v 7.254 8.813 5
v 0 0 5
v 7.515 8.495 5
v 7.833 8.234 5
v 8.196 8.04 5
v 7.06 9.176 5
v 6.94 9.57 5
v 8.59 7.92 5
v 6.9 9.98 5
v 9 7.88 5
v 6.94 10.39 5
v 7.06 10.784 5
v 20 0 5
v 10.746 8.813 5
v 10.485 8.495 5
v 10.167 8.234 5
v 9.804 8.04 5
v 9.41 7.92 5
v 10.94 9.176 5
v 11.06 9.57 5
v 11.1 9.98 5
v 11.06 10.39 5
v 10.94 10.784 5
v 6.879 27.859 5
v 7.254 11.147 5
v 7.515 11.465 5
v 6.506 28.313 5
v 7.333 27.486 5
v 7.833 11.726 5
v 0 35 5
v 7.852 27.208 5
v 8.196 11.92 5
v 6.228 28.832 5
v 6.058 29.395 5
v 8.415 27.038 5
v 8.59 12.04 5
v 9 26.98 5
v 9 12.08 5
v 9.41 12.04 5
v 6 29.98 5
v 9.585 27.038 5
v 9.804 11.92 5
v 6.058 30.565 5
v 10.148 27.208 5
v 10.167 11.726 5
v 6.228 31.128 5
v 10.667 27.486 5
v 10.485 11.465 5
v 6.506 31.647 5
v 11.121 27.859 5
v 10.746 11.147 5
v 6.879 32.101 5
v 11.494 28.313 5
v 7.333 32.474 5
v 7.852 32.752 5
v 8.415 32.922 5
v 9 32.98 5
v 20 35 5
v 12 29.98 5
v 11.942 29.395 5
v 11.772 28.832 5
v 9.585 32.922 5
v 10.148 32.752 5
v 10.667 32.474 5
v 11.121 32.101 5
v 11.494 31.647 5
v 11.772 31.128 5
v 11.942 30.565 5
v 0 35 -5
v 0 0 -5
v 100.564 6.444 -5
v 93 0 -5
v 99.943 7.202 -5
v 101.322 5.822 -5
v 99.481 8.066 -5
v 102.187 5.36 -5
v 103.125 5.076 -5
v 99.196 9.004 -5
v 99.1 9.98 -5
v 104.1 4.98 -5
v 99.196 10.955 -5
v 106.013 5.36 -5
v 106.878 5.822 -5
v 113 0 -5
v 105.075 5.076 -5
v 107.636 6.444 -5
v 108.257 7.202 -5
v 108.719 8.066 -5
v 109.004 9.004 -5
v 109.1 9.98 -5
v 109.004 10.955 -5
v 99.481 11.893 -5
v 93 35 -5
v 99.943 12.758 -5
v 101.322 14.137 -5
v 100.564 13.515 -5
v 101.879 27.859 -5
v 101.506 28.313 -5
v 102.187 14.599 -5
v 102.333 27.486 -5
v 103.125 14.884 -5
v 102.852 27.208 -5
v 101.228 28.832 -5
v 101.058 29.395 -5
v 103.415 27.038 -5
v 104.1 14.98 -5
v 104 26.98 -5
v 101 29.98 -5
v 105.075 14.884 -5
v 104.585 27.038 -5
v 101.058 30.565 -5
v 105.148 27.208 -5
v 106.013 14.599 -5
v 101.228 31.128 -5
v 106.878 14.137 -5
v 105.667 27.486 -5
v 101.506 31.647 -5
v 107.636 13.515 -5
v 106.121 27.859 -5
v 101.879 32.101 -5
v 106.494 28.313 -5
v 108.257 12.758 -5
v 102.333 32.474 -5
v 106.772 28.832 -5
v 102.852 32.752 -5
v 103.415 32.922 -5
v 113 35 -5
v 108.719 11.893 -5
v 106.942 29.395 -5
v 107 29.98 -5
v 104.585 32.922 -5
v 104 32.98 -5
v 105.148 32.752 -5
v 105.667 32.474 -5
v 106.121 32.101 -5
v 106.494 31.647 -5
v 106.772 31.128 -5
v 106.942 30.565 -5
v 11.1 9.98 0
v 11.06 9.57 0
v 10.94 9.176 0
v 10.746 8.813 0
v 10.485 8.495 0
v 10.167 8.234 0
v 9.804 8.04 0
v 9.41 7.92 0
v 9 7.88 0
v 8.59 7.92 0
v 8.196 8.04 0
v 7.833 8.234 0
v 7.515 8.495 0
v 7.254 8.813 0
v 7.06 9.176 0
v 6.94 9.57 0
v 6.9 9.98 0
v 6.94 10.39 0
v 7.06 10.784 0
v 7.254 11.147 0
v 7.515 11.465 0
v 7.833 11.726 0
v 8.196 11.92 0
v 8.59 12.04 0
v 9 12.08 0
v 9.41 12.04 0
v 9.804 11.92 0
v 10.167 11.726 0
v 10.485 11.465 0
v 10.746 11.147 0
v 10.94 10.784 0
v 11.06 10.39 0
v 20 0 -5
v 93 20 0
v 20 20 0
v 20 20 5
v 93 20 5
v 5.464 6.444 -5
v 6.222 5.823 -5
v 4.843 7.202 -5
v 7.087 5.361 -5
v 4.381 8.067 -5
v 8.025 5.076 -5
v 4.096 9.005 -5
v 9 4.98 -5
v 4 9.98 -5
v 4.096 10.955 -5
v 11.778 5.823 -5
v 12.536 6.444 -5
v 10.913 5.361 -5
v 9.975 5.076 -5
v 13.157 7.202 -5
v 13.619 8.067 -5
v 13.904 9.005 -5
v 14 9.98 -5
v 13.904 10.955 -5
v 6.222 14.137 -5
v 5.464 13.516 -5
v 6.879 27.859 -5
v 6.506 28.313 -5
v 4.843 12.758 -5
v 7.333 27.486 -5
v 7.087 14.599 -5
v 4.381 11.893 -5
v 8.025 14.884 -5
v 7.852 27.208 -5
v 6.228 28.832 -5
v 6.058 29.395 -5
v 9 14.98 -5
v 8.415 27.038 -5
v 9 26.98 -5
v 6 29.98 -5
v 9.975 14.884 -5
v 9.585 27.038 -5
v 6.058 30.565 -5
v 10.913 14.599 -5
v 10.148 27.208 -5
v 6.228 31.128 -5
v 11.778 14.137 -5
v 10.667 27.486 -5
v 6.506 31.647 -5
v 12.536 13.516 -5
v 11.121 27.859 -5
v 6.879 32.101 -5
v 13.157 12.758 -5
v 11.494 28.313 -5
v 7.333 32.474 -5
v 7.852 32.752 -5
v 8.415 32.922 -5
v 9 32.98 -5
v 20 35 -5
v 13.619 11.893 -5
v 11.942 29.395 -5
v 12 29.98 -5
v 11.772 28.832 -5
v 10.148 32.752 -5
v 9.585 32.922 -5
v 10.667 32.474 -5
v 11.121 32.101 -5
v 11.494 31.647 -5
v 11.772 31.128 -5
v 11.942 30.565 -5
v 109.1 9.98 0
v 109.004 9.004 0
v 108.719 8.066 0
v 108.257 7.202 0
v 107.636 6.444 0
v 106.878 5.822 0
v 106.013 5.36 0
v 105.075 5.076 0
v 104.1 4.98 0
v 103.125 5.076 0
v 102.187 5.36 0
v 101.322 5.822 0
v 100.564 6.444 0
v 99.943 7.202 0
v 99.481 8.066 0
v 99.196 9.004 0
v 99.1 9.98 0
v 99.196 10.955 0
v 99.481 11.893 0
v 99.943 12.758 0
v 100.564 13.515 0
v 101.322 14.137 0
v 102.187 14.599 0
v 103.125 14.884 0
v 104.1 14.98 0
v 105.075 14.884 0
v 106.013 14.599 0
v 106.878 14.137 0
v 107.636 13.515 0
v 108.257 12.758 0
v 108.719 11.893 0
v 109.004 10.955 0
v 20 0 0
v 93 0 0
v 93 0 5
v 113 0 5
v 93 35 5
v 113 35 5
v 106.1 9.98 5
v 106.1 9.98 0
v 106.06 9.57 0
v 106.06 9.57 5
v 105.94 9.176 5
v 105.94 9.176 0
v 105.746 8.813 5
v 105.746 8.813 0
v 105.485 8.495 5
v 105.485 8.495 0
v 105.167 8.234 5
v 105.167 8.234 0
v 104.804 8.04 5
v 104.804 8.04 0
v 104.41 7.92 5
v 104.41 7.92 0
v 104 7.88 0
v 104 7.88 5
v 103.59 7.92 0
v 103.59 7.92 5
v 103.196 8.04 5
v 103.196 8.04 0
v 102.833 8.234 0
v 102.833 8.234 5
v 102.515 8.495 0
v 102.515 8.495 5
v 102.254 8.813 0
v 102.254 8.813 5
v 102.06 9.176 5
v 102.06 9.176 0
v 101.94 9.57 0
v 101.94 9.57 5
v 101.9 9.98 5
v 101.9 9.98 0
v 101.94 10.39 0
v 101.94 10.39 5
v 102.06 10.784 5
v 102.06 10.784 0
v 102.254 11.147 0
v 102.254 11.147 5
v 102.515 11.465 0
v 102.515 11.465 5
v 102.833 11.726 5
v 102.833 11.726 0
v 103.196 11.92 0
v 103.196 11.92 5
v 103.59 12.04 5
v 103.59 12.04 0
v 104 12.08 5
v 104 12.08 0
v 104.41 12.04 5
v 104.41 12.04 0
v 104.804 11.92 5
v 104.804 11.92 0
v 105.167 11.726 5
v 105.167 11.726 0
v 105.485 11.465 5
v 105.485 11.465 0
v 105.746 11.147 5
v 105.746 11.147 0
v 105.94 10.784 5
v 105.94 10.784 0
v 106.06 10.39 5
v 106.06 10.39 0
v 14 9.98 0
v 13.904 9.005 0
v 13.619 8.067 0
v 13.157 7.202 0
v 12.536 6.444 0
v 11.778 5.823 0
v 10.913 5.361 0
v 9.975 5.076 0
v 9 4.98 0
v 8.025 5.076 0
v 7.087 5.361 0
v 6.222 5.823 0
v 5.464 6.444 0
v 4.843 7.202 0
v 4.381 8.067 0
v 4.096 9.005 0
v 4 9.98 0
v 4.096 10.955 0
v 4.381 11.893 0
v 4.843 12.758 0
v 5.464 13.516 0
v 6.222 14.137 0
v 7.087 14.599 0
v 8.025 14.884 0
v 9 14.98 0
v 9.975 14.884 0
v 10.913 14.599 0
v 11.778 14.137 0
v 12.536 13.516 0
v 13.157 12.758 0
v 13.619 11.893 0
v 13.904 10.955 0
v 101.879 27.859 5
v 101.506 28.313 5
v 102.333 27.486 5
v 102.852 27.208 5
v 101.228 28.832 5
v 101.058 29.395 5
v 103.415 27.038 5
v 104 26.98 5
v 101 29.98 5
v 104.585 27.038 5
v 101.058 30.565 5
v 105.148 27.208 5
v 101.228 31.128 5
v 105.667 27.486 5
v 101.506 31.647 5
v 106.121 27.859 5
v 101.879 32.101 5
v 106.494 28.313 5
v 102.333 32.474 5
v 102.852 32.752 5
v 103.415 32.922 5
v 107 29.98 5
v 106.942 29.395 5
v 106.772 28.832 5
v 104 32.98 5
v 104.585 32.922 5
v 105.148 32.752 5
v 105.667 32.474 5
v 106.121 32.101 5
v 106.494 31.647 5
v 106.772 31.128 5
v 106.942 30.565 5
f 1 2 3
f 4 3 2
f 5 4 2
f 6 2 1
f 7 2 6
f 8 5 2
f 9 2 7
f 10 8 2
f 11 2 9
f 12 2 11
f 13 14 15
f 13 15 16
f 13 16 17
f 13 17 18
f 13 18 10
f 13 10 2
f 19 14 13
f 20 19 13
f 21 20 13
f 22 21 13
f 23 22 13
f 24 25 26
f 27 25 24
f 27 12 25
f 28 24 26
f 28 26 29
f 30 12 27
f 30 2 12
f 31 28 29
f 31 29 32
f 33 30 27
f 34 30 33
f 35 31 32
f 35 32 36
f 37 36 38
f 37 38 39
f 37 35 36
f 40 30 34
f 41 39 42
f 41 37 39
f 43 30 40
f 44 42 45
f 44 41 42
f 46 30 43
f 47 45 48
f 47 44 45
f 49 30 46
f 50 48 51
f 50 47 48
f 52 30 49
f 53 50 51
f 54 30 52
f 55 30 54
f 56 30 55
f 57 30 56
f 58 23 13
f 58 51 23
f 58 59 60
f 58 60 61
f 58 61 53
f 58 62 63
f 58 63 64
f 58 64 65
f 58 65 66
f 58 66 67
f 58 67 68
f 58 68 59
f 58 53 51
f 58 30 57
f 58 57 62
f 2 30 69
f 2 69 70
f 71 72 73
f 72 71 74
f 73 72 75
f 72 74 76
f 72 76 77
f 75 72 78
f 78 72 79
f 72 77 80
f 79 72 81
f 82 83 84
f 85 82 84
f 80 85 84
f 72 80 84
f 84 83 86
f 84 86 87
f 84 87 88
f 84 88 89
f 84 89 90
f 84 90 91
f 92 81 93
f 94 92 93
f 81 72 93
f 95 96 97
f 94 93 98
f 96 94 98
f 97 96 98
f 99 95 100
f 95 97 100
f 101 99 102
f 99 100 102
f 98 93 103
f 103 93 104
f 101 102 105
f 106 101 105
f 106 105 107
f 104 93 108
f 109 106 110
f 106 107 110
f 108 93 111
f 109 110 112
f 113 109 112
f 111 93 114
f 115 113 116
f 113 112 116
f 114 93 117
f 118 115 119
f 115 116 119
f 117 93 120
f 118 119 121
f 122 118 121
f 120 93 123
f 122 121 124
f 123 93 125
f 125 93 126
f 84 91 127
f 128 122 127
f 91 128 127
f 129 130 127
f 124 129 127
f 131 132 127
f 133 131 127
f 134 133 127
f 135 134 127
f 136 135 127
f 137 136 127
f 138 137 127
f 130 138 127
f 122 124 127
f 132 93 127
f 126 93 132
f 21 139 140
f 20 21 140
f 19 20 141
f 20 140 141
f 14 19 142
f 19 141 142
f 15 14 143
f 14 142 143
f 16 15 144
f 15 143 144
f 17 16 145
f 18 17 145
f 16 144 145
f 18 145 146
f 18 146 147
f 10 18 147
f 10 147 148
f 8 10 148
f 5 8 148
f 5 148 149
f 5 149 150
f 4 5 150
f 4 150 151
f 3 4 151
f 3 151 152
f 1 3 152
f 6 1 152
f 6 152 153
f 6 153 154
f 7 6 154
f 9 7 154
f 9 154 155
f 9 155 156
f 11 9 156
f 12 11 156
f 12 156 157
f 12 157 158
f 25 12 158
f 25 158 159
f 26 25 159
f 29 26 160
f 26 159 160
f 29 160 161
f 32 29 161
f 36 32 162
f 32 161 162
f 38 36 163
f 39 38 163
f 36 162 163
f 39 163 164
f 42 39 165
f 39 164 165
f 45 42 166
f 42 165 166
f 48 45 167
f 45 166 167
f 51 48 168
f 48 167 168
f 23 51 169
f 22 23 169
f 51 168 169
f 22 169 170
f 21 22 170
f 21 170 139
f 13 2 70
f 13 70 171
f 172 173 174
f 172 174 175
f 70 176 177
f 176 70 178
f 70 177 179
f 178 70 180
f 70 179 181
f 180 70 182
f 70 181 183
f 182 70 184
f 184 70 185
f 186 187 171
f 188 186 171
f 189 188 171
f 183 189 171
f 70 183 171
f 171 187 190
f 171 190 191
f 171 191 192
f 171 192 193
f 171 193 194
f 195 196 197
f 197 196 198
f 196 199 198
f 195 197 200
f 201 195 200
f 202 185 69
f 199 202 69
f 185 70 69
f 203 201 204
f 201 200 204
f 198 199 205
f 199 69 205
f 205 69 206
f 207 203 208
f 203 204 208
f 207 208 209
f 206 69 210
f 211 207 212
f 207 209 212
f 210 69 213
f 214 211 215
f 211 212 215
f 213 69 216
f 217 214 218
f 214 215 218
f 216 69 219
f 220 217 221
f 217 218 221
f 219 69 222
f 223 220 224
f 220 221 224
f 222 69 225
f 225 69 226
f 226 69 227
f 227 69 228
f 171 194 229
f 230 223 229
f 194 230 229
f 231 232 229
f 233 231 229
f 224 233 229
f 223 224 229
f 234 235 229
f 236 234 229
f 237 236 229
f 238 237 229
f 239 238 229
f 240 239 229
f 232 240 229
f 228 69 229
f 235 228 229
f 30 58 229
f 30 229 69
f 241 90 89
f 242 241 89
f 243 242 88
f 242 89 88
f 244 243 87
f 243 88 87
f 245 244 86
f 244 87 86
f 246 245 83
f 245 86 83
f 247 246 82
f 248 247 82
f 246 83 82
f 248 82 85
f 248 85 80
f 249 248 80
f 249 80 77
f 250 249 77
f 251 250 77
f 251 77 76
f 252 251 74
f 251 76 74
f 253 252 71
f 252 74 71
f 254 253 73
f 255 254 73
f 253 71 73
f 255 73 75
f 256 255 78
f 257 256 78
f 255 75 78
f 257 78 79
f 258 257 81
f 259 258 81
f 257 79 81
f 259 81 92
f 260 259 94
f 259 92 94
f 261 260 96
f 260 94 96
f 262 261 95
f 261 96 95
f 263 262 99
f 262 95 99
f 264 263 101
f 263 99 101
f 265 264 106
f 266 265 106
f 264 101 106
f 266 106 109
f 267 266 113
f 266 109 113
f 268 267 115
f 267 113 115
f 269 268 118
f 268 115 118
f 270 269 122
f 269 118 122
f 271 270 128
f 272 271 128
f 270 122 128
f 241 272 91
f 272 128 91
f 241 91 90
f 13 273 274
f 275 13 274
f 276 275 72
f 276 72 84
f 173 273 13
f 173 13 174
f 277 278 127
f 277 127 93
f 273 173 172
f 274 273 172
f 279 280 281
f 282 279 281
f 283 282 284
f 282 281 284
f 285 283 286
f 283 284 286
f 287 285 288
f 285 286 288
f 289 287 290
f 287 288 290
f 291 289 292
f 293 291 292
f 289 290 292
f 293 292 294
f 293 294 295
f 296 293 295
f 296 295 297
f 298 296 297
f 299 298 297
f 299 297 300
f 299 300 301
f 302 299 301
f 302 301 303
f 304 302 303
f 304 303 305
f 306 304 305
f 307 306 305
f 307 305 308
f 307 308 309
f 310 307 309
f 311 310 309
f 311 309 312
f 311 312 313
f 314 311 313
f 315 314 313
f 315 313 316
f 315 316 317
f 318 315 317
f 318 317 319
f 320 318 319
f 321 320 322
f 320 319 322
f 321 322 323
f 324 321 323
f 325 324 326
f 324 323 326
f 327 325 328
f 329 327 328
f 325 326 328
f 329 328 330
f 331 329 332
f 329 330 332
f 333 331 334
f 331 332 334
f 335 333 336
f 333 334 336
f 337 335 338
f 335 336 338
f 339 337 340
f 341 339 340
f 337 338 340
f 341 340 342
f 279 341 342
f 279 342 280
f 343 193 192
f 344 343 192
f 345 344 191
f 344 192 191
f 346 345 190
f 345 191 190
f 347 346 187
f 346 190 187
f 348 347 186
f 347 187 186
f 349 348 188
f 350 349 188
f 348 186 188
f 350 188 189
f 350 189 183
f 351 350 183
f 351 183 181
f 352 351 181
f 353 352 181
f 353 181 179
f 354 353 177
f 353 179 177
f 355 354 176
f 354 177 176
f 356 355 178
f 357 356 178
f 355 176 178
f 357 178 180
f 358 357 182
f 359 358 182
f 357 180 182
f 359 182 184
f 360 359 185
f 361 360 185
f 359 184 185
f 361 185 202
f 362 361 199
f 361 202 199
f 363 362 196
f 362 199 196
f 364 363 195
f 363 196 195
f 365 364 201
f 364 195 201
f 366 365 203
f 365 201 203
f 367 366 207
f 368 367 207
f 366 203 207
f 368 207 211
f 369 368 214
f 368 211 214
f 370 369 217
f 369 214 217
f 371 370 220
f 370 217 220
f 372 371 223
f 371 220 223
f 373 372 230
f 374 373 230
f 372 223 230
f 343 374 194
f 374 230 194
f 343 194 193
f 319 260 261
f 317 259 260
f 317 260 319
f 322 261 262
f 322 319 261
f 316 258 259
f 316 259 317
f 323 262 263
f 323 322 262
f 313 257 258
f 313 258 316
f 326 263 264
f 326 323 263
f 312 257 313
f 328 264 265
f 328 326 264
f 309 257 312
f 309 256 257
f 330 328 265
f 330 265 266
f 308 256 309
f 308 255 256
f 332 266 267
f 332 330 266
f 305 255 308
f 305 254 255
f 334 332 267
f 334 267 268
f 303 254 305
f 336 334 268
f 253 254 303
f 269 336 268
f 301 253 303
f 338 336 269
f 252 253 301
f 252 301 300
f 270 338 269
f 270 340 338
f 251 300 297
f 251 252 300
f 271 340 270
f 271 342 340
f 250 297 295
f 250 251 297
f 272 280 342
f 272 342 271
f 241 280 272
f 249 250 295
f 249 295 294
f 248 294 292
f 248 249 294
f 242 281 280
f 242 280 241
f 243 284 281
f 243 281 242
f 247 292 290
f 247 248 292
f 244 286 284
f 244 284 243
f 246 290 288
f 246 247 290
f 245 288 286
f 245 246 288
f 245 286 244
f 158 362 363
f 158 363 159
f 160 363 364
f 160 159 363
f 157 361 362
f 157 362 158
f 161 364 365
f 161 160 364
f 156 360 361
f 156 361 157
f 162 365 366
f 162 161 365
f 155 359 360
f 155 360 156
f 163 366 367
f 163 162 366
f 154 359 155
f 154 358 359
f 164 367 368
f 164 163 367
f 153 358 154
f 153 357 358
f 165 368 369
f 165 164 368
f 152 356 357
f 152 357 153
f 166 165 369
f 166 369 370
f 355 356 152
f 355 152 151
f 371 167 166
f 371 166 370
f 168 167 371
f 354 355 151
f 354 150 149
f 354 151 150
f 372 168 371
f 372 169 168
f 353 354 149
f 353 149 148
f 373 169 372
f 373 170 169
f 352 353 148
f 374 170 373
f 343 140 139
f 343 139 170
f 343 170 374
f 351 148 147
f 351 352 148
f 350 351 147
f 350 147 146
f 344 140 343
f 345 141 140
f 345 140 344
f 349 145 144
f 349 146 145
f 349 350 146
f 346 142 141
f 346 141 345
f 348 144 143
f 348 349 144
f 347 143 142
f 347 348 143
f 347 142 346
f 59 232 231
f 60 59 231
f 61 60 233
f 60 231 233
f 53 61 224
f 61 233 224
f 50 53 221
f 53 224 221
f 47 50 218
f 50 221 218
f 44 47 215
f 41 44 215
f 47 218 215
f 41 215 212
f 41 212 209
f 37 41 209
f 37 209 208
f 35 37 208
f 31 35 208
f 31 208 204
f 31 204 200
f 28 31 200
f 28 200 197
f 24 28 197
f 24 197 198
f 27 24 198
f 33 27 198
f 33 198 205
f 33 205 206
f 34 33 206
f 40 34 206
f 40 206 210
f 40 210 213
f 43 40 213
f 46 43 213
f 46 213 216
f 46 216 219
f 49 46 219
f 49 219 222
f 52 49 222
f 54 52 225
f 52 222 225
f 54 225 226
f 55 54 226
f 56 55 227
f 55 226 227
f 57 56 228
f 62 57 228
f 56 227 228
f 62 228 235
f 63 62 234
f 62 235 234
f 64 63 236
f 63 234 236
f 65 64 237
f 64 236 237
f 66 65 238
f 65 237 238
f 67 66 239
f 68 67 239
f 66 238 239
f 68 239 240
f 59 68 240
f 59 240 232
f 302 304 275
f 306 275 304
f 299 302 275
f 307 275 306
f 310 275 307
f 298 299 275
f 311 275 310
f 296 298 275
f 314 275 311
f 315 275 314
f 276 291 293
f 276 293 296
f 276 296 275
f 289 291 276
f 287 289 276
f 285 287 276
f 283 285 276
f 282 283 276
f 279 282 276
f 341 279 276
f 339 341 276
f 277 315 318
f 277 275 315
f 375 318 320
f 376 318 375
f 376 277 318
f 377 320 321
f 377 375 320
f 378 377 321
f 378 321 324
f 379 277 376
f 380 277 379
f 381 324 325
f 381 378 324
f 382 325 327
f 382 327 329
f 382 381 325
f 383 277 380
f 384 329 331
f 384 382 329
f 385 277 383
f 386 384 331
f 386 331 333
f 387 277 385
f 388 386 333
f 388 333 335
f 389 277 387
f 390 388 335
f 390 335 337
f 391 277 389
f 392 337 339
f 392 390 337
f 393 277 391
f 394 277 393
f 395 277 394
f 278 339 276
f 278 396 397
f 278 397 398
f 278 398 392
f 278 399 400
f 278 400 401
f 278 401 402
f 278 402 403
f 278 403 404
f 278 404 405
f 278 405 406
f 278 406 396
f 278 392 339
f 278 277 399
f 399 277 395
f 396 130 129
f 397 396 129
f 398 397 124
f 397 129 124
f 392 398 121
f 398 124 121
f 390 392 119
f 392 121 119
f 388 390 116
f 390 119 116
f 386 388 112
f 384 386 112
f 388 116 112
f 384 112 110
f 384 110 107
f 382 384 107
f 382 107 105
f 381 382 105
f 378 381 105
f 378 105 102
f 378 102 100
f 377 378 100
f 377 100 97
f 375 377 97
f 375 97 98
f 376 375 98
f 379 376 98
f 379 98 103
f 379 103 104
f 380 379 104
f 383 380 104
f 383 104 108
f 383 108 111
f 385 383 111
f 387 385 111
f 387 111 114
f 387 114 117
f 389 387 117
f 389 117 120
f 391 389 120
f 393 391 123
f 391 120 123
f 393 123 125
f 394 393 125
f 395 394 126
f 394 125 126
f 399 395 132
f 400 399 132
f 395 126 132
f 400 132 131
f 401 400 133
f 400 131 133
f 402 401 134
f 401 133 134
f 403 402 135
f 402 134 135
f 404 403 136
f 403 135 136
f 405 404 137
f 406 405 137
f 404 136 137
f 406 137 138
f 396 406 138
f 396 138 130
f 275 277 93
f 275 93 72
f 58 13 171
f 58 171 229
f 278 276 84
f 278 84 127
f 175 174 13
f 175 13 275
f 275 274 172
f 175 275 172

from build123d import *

# Parameters (mm, degrees)
F0_W     = 73
F0_H     = 20
F1_DEPTH = 5
F3_DEPTH = 10
F4_R     = 2.1
F4_R_2   = 3
F5_DEPTH = 25
F6_R     = 5
F6_R_2   = 2.1
F7_DEPTH = 5


with BuildPart() as f1:
    # F0 (on Top) → F1 (new body)
    with BuildSketch(Plane.XY):
        with Locations((56.5, 10)):
            Rectangle(F0_W, F0_H)
    extrude(amount=F1_DEPTH)


with BuildPart() as f3:
    # F2 (on face) → F3 (new body)
    with BuildSketch(Plane.XY.offset(5)):
        Polygon((0, 35), (0, 0), (20, 0), (20, 20), (20, 35), align=None)
        Polygon((93, 20), (93, 0), (113, 0), (113, 35), (93, 35), align=None)
    extrude(amount=-F3_DEPTH)

    # F4 (on face) → F5 (cut)
    with BuildSketch(Plane(origin=(0, 0, -5), x_dir=(1, 0, 0), z_dir=(0, 0, -1))):
        with Locations((9, -9.98)):
            Circle(F4_R)
        with Locations((9, -29.98)):
            Circle(F4_R_2)
        with Locations((104, -9.98)):
            Circle(F4_R)
        with Locations((104, -29.98)):
            Circle(F4_R_2)
    extrude(amount=-F5_DEPTH, mode=Mode.SUBTRACT)

    # F6 (on face) → F7 (cut)
    with BuildSketch(Plane(origin=(0, 0, -5), x_dir=(1, 0, 0), z_dir=(0, 0, -1))):
        with Locations((9, -9.98)):
            Circle(F6_R)
        with Locations((9, -9.98)):
            Circle(F6_R_2, mode=Mode.SUBTRACT)
        with Locations((104.1, -9.979821)):
            Circle(F6_R)
    extrude(amount=-F7_DEPTH, mode=Mode.SUBTRACT)


solid = Compound([f1.part, f3.part])
